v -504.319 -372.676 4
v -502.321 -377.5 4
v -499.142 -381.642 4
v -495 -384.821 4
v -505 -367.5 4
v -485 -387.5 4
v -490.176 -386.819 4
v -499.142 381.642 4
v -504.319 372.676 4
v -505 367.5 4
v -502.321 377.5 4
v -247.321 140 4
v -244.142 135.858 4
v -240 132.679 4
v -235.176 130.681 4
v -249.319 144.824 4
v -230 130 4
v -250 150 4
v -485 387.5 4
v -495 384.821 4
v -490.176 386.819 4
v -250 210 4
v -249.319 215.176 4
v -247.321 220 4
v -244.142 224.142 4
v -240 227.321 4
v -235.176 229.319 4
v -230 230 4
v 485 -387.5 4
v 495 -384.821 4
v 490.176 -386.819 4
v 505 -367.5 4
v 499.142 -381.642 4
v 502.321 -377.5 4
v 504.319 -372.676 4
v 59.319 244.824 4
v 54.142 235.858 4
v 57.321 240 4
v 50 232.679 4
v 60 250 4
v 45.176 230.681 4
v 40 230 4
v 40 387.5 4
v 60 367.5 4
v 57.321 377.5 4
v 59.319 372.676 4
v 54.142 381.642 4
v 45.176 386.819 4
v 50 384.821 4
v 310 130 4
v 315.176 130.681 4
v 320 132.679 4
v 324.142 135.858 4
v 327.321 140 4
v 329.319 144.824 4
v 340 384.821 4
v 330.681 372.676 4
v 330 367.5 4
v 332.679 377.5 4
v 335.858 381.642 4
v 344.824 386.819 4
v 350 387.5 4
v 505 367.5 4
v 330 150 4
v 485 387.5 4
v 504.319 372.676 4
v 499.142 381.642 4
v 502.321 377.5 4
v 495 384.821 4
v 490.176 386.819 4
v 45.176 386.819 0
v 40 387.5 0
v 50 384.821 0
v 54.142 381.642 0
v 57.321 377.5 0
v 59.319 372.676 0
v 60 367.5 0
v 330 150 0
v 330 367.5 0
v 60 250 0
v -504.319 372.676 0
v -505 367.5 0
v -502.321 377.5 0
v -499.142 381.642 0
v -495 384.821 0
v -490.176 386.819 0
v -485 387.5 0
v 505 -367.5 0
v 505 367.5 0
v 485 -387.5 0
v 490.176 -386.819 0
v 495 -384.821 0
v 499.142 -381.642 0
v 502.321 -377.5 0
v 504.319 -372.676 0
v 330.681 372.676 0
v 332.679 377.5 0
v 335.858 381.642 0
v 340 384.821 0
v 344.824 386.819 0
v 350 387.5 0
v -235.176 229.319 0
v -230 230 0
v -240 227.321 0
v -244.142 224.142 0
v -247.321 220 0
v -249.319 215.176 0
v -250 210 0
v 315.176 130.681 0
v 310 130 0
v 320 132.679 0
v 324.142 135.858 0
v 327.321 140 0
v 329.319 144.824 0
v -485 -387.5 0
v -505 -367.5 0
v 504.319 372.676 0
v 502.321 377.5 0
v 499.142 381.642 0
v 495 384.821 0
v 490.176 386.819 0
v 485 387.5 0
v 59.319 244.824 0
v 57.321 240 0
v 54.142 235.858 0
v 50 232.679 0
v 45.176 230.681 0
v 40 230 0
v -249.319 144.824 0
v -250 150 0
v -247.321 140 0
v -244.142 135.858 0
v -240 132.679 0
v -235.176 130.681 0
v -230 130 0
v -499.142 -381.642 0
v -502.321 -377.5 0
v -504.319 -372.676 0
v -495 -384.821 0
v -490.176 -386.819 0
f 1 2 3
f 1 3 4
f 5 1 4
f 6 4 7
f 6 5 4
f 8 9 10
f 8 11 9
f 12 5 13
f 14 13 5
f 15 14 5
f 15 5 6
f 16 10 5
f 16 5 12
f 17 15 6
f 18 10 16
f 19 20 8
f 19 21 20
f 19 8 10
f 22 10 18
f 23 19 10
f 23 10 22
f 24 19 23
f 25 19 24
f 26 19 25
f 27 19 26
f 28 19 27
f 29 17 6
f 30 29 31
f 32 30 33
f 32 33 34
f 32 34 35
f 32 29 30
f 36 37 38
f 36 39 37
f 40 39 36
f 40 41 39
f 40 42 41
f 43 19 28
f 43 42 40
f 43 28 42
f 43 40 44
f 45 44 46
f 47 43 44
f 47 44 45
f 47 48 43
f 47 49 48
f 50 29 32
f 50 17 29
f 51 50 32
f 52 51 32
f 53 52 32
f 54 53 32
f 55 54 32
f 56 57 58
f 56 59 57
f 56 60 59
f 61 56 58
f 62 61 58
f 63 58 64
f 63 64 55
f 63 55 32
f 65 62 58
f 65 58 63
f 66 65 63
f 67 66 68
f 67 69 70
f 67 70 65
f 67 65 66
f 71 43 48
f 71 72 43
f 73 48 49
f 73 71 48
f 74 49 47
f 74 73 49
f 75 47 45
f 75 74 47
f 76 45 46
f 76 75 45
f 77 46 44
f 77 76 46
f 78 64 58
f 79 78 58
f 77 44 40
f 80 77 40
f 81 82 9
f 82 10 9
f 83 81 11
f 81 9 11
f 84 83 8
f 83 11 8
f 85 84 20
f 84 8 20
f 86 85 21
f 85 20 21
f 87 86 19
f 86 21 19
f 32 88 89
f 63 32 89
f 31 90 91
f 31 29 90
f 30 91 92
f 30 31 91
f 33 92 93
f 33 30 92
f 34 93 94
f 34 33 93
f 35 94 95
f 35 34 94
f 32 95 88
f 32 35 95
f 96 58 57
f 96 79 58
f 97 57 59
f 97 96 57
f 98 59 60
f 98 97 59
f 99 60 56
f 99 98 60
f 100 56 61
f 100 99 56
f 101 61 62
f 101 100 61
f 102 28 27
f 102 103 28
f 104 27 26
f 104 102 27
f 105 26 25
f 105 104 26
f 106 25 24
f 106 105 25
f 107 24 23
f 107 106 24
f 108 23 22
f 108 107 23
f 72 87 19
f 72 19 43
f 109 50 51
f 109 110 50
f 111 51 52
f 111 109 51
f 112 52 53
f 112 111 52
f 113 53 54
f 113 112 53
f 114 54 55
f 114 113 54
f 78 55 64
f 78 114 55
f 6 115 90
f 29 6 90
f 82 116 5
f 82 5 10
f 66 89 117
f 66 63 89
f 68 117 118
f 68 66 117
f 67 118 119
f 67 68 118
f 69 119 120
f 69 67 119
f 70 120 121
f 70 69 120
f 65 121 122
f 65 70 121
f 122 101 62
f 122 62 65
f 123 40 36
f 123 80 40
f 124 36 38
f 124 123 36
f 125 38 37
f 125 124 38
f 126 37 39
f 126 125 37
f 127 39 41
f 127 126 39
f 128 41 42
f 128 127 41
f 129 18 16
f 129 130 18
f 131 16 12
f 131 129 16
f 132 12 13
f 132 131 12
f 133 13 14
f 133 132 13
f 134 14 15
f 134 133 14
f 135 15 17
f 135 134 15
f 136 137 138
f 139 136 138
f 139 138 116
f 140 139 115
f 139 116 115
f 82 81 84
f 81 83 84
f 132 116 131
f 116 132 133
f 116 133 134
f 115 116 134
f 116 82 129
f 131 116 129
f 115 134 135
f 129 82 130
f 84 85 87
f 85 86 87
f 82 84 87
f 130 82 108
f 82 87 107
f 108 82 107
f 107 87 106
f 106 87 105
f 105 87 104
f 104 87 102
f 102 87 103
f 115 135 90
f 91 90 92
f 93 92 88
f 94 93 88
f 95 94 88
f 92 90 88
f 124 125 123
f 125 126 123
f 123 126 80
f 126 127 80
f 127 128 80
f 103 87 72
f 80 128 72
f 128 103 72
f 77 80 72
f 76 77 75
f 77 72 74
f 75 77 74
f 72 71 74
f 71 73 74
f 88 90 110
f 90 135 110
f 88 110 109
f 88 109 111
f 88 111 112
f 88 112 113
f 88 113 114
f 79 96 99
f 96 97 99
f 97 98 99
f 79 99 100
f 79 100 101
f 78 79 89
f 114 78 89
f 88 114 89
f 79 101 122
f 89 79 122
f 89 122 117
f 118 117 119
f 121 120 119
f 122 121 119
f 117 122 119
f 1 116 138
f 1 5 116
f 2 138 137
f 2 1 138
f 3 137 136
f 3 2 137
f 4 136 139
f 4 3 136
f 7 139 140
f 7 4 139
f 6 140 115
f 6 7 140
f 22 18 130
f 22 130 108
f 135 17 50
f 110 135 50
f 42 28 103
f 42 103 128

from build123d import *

# Parameters (mm, degrees)
SKETCH1_W           = 1010
SKETCH1_H           = 775
BOSS_EXTRUDE1_DEPTH = 4
FILLET1_R           = 20
SKETCH2_W           = 500
SKETCH2_H           = 100
SKETCH2_W_2         = 80
CUT_EXTRUDE1_DEPTH  = 10
FILLET2_R           = 20


with BuildPart() as part:
    # Sketch1 → Boss-Extrude1 (new body)
    with BuildSketch(Plane.XY):
        Rectangle(SKETCH1_W, SKETCH1_H)
    extrude(amount=BOSS_EXTRUDE1_DEPTH)

    # Fillet1
    fillet1_edges = [part.edges().sort_by_distance(p)[0] for p in [
        (505, -387.5, 2),
        (-505, -387.5, 2),
        (-505, 387.5, 2),
        (505, 387.5, 2),
    ]]
    fillet(fillet1_edges, radius=FILLET1_R)

    # Sketch2 → Cut-Extrude1 (cut)
    with BuildSketch(Plane.XY.offset(4)):
        Polygon((60, 230), (250, 230), (330, 230), (330, 387.5), (60, 387.5), align=None)
        with Locations((0, 180)):
            Rectangle(SKETCH2_W, SKETCH2_H)
        with Locations((290, 180)):
            Rectangle(SKETCH2_W_2, SKETCH2_H)
    extrude(amount=-CUT_EXTRUDE1_DEPTH, mode=Mode.SUBTRACT)

    # Fillet2
    fillet2_edges = [part.edges().sort_by_distance(p)[0] for p in [
        (60, 387.5, 2),
        (330, 387.5, 2),
        (330, 130, 2),
        (-250, 130, 2),
        (-250, 230, 2),
        (60, 230, 2),
    ]]
    fillet(fillet2_edges, radius=FILLET2_R)


solid = part.part
